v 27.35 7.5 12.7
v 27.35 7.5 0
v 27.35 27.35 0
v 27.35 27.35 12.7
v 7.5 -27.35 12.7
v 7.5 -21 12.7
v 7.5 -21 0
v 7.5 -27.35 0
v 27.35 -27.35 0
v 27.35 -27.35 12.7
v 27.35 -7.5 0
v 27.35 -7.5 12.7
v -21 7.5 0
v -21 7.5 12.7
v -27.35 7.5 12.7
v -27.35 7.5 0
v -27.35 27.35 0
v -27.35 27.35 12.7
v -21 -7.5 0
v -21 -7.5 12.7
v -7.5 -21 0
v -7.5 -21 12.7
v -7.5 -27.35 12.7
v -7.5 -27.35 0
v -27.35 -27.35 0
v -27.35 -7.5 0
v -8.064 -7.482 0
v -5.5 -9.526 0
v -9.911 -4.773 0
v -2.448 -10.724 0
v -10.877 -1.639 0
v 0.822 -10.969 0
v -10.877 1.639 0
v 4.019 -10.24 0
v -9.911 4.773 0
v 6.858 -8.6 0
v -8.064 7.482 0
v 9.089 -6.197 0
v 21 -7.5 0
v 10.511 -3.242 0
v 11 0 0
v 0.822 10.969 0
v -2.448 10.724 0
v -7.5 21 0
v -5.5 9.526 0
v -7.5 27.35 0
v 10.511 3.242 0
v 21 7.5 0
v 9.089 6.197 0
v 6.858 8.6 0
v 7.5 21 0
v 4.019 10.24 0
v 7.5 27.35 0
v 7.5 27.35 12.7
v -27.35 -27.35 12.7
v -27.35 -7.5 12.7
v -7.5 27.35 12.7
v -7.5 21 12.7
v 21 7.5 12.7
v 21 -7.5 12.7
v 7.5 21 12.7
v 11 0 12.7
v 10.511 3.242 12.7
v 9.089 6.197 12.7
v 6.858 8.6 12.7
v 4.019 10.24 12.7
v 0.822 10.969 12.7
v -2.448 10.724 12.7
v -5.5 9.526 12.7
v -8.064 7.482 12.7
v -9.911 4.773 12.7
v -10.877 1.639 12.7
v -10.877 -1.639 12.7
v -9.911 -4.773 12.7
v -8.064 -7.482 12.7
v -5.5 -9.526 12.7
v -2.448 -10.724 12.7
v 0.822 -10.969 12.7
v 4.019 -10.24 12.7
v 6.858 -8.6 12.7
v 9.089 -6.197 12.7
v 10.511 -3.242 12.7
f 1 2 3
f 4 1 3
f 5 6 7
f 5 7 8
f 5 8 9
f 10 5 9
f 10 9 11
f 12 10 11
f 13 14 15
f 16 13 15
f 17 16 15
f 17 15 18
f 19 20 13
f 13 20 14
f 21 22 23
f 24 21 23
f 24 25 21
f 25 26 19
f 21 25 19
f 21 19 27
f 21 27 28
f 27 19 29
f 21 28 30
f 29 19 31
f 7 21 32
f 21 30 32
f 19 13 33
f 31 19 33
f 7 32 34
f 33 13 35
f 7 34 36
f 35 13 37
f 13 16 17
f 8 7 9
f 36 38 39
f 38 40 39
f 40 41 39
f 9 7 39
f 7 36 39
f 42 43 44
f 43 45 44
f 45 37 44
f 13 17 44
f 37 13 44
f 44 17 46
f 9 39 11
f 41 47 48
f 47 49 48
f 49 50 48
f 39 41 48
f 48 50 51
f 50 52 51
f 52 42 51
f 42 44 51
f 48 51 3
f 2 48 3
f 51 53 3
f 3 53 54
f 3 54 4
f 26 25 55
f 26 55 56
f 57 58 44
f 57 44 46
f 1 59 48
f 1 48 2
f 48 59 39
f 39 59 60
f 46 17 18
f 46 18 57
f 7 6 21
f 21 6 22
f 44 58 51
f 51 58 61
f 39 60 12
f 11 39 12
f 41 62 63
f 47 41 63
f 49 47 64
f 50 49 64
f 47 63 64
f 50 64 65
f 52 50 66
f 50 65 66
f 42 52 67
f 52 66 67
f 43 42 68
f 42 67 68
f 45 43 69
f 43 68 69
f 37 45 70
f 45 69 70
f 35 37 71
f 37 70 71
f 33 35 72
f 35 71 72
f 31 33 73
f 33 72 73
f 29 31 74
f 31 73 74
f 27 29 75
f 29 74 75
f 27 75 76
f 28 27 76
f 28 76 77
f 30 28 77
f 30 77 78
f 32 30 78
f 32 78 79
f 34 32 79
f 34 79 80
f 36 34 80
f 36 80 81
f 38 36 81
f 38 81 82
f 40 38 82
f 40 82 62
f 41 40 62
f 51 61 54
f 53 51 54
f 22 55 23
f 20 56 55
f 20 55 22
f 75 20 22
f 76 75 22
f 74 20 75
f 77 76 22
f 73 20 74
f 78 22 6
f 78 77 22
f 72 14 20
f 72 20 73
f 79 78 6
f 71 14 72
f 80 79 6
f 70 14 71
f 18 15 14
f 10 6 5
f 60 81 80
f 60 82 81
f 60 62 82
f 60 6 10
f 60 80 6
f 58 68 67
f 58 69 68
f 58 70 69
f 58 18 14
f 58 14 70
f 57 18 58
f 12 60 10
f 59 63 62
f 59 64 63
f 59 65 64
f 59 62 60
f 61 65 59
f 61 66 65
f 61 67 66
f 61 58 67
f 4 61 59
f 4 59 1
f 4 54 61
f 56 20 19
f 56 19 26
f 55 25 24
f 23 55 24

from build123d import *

# Parameters (mm, degrees)
SKETCH1_W           = 54.7
SKETCH1_H           = 54.7
BOSS_EXTRUDE1_DEPTH = 12.7
SKETCH2_W           = 15
SKETCH2_H           = 6.35
CUT_EXTRUDE1_DEPTH  = 41.710379512
SKETCH3_R           = 11
CUT_EXTRUDE2_DEPTH  = 41.710379512
CIRPATTERN1_COUNT   = 4


with BuildPart() as part:
    # Sketch1 → Boss-Extrude1 (new body)
    with BuildSketch(Plane.XY):
        Rectangle(SKETCH1_W, SKETCH1_H)
    extrude(amount=BOSS_EXTRUDE1_DEPTH)

    # Sketch2 → Cut-Extrude1 (cut, through all)
    with BuildSketch(Plane.XY.offset(12.7)):
        with Locations((0, 24.175)):
            Rectangle(SKETCH2_W, SKETCH2_H)
    cut_extrude1 = extrude(amount=-CUT_EXTRUDE1_DEPTH, mode=Mode.SUBTRACT)

    # Sketch3 → Cut-Extrude2 (cut, through all)
    with BuildSketch(Plane.XY.offset(12.7)):
        Circle(SKETCH3_R)
    extrude(amount=-CUT_EXTRUDE2_DEPTH, mode=Mode.SUBTRACT)

    # CirPattern1: Cut-Extrude1 ×4 about axis
    cirpattern1_axis = Axis((0, 0, 0), (0, 0, 1))
    for i in range(1, CIRPATTERN1_COUNT):
        add(cut_extrude1.rotate(cirpattern1_axis, i * 360 / CIRPATTERN1_COUNT), mode=Mode.SUBTRACT)


solid = part.part
